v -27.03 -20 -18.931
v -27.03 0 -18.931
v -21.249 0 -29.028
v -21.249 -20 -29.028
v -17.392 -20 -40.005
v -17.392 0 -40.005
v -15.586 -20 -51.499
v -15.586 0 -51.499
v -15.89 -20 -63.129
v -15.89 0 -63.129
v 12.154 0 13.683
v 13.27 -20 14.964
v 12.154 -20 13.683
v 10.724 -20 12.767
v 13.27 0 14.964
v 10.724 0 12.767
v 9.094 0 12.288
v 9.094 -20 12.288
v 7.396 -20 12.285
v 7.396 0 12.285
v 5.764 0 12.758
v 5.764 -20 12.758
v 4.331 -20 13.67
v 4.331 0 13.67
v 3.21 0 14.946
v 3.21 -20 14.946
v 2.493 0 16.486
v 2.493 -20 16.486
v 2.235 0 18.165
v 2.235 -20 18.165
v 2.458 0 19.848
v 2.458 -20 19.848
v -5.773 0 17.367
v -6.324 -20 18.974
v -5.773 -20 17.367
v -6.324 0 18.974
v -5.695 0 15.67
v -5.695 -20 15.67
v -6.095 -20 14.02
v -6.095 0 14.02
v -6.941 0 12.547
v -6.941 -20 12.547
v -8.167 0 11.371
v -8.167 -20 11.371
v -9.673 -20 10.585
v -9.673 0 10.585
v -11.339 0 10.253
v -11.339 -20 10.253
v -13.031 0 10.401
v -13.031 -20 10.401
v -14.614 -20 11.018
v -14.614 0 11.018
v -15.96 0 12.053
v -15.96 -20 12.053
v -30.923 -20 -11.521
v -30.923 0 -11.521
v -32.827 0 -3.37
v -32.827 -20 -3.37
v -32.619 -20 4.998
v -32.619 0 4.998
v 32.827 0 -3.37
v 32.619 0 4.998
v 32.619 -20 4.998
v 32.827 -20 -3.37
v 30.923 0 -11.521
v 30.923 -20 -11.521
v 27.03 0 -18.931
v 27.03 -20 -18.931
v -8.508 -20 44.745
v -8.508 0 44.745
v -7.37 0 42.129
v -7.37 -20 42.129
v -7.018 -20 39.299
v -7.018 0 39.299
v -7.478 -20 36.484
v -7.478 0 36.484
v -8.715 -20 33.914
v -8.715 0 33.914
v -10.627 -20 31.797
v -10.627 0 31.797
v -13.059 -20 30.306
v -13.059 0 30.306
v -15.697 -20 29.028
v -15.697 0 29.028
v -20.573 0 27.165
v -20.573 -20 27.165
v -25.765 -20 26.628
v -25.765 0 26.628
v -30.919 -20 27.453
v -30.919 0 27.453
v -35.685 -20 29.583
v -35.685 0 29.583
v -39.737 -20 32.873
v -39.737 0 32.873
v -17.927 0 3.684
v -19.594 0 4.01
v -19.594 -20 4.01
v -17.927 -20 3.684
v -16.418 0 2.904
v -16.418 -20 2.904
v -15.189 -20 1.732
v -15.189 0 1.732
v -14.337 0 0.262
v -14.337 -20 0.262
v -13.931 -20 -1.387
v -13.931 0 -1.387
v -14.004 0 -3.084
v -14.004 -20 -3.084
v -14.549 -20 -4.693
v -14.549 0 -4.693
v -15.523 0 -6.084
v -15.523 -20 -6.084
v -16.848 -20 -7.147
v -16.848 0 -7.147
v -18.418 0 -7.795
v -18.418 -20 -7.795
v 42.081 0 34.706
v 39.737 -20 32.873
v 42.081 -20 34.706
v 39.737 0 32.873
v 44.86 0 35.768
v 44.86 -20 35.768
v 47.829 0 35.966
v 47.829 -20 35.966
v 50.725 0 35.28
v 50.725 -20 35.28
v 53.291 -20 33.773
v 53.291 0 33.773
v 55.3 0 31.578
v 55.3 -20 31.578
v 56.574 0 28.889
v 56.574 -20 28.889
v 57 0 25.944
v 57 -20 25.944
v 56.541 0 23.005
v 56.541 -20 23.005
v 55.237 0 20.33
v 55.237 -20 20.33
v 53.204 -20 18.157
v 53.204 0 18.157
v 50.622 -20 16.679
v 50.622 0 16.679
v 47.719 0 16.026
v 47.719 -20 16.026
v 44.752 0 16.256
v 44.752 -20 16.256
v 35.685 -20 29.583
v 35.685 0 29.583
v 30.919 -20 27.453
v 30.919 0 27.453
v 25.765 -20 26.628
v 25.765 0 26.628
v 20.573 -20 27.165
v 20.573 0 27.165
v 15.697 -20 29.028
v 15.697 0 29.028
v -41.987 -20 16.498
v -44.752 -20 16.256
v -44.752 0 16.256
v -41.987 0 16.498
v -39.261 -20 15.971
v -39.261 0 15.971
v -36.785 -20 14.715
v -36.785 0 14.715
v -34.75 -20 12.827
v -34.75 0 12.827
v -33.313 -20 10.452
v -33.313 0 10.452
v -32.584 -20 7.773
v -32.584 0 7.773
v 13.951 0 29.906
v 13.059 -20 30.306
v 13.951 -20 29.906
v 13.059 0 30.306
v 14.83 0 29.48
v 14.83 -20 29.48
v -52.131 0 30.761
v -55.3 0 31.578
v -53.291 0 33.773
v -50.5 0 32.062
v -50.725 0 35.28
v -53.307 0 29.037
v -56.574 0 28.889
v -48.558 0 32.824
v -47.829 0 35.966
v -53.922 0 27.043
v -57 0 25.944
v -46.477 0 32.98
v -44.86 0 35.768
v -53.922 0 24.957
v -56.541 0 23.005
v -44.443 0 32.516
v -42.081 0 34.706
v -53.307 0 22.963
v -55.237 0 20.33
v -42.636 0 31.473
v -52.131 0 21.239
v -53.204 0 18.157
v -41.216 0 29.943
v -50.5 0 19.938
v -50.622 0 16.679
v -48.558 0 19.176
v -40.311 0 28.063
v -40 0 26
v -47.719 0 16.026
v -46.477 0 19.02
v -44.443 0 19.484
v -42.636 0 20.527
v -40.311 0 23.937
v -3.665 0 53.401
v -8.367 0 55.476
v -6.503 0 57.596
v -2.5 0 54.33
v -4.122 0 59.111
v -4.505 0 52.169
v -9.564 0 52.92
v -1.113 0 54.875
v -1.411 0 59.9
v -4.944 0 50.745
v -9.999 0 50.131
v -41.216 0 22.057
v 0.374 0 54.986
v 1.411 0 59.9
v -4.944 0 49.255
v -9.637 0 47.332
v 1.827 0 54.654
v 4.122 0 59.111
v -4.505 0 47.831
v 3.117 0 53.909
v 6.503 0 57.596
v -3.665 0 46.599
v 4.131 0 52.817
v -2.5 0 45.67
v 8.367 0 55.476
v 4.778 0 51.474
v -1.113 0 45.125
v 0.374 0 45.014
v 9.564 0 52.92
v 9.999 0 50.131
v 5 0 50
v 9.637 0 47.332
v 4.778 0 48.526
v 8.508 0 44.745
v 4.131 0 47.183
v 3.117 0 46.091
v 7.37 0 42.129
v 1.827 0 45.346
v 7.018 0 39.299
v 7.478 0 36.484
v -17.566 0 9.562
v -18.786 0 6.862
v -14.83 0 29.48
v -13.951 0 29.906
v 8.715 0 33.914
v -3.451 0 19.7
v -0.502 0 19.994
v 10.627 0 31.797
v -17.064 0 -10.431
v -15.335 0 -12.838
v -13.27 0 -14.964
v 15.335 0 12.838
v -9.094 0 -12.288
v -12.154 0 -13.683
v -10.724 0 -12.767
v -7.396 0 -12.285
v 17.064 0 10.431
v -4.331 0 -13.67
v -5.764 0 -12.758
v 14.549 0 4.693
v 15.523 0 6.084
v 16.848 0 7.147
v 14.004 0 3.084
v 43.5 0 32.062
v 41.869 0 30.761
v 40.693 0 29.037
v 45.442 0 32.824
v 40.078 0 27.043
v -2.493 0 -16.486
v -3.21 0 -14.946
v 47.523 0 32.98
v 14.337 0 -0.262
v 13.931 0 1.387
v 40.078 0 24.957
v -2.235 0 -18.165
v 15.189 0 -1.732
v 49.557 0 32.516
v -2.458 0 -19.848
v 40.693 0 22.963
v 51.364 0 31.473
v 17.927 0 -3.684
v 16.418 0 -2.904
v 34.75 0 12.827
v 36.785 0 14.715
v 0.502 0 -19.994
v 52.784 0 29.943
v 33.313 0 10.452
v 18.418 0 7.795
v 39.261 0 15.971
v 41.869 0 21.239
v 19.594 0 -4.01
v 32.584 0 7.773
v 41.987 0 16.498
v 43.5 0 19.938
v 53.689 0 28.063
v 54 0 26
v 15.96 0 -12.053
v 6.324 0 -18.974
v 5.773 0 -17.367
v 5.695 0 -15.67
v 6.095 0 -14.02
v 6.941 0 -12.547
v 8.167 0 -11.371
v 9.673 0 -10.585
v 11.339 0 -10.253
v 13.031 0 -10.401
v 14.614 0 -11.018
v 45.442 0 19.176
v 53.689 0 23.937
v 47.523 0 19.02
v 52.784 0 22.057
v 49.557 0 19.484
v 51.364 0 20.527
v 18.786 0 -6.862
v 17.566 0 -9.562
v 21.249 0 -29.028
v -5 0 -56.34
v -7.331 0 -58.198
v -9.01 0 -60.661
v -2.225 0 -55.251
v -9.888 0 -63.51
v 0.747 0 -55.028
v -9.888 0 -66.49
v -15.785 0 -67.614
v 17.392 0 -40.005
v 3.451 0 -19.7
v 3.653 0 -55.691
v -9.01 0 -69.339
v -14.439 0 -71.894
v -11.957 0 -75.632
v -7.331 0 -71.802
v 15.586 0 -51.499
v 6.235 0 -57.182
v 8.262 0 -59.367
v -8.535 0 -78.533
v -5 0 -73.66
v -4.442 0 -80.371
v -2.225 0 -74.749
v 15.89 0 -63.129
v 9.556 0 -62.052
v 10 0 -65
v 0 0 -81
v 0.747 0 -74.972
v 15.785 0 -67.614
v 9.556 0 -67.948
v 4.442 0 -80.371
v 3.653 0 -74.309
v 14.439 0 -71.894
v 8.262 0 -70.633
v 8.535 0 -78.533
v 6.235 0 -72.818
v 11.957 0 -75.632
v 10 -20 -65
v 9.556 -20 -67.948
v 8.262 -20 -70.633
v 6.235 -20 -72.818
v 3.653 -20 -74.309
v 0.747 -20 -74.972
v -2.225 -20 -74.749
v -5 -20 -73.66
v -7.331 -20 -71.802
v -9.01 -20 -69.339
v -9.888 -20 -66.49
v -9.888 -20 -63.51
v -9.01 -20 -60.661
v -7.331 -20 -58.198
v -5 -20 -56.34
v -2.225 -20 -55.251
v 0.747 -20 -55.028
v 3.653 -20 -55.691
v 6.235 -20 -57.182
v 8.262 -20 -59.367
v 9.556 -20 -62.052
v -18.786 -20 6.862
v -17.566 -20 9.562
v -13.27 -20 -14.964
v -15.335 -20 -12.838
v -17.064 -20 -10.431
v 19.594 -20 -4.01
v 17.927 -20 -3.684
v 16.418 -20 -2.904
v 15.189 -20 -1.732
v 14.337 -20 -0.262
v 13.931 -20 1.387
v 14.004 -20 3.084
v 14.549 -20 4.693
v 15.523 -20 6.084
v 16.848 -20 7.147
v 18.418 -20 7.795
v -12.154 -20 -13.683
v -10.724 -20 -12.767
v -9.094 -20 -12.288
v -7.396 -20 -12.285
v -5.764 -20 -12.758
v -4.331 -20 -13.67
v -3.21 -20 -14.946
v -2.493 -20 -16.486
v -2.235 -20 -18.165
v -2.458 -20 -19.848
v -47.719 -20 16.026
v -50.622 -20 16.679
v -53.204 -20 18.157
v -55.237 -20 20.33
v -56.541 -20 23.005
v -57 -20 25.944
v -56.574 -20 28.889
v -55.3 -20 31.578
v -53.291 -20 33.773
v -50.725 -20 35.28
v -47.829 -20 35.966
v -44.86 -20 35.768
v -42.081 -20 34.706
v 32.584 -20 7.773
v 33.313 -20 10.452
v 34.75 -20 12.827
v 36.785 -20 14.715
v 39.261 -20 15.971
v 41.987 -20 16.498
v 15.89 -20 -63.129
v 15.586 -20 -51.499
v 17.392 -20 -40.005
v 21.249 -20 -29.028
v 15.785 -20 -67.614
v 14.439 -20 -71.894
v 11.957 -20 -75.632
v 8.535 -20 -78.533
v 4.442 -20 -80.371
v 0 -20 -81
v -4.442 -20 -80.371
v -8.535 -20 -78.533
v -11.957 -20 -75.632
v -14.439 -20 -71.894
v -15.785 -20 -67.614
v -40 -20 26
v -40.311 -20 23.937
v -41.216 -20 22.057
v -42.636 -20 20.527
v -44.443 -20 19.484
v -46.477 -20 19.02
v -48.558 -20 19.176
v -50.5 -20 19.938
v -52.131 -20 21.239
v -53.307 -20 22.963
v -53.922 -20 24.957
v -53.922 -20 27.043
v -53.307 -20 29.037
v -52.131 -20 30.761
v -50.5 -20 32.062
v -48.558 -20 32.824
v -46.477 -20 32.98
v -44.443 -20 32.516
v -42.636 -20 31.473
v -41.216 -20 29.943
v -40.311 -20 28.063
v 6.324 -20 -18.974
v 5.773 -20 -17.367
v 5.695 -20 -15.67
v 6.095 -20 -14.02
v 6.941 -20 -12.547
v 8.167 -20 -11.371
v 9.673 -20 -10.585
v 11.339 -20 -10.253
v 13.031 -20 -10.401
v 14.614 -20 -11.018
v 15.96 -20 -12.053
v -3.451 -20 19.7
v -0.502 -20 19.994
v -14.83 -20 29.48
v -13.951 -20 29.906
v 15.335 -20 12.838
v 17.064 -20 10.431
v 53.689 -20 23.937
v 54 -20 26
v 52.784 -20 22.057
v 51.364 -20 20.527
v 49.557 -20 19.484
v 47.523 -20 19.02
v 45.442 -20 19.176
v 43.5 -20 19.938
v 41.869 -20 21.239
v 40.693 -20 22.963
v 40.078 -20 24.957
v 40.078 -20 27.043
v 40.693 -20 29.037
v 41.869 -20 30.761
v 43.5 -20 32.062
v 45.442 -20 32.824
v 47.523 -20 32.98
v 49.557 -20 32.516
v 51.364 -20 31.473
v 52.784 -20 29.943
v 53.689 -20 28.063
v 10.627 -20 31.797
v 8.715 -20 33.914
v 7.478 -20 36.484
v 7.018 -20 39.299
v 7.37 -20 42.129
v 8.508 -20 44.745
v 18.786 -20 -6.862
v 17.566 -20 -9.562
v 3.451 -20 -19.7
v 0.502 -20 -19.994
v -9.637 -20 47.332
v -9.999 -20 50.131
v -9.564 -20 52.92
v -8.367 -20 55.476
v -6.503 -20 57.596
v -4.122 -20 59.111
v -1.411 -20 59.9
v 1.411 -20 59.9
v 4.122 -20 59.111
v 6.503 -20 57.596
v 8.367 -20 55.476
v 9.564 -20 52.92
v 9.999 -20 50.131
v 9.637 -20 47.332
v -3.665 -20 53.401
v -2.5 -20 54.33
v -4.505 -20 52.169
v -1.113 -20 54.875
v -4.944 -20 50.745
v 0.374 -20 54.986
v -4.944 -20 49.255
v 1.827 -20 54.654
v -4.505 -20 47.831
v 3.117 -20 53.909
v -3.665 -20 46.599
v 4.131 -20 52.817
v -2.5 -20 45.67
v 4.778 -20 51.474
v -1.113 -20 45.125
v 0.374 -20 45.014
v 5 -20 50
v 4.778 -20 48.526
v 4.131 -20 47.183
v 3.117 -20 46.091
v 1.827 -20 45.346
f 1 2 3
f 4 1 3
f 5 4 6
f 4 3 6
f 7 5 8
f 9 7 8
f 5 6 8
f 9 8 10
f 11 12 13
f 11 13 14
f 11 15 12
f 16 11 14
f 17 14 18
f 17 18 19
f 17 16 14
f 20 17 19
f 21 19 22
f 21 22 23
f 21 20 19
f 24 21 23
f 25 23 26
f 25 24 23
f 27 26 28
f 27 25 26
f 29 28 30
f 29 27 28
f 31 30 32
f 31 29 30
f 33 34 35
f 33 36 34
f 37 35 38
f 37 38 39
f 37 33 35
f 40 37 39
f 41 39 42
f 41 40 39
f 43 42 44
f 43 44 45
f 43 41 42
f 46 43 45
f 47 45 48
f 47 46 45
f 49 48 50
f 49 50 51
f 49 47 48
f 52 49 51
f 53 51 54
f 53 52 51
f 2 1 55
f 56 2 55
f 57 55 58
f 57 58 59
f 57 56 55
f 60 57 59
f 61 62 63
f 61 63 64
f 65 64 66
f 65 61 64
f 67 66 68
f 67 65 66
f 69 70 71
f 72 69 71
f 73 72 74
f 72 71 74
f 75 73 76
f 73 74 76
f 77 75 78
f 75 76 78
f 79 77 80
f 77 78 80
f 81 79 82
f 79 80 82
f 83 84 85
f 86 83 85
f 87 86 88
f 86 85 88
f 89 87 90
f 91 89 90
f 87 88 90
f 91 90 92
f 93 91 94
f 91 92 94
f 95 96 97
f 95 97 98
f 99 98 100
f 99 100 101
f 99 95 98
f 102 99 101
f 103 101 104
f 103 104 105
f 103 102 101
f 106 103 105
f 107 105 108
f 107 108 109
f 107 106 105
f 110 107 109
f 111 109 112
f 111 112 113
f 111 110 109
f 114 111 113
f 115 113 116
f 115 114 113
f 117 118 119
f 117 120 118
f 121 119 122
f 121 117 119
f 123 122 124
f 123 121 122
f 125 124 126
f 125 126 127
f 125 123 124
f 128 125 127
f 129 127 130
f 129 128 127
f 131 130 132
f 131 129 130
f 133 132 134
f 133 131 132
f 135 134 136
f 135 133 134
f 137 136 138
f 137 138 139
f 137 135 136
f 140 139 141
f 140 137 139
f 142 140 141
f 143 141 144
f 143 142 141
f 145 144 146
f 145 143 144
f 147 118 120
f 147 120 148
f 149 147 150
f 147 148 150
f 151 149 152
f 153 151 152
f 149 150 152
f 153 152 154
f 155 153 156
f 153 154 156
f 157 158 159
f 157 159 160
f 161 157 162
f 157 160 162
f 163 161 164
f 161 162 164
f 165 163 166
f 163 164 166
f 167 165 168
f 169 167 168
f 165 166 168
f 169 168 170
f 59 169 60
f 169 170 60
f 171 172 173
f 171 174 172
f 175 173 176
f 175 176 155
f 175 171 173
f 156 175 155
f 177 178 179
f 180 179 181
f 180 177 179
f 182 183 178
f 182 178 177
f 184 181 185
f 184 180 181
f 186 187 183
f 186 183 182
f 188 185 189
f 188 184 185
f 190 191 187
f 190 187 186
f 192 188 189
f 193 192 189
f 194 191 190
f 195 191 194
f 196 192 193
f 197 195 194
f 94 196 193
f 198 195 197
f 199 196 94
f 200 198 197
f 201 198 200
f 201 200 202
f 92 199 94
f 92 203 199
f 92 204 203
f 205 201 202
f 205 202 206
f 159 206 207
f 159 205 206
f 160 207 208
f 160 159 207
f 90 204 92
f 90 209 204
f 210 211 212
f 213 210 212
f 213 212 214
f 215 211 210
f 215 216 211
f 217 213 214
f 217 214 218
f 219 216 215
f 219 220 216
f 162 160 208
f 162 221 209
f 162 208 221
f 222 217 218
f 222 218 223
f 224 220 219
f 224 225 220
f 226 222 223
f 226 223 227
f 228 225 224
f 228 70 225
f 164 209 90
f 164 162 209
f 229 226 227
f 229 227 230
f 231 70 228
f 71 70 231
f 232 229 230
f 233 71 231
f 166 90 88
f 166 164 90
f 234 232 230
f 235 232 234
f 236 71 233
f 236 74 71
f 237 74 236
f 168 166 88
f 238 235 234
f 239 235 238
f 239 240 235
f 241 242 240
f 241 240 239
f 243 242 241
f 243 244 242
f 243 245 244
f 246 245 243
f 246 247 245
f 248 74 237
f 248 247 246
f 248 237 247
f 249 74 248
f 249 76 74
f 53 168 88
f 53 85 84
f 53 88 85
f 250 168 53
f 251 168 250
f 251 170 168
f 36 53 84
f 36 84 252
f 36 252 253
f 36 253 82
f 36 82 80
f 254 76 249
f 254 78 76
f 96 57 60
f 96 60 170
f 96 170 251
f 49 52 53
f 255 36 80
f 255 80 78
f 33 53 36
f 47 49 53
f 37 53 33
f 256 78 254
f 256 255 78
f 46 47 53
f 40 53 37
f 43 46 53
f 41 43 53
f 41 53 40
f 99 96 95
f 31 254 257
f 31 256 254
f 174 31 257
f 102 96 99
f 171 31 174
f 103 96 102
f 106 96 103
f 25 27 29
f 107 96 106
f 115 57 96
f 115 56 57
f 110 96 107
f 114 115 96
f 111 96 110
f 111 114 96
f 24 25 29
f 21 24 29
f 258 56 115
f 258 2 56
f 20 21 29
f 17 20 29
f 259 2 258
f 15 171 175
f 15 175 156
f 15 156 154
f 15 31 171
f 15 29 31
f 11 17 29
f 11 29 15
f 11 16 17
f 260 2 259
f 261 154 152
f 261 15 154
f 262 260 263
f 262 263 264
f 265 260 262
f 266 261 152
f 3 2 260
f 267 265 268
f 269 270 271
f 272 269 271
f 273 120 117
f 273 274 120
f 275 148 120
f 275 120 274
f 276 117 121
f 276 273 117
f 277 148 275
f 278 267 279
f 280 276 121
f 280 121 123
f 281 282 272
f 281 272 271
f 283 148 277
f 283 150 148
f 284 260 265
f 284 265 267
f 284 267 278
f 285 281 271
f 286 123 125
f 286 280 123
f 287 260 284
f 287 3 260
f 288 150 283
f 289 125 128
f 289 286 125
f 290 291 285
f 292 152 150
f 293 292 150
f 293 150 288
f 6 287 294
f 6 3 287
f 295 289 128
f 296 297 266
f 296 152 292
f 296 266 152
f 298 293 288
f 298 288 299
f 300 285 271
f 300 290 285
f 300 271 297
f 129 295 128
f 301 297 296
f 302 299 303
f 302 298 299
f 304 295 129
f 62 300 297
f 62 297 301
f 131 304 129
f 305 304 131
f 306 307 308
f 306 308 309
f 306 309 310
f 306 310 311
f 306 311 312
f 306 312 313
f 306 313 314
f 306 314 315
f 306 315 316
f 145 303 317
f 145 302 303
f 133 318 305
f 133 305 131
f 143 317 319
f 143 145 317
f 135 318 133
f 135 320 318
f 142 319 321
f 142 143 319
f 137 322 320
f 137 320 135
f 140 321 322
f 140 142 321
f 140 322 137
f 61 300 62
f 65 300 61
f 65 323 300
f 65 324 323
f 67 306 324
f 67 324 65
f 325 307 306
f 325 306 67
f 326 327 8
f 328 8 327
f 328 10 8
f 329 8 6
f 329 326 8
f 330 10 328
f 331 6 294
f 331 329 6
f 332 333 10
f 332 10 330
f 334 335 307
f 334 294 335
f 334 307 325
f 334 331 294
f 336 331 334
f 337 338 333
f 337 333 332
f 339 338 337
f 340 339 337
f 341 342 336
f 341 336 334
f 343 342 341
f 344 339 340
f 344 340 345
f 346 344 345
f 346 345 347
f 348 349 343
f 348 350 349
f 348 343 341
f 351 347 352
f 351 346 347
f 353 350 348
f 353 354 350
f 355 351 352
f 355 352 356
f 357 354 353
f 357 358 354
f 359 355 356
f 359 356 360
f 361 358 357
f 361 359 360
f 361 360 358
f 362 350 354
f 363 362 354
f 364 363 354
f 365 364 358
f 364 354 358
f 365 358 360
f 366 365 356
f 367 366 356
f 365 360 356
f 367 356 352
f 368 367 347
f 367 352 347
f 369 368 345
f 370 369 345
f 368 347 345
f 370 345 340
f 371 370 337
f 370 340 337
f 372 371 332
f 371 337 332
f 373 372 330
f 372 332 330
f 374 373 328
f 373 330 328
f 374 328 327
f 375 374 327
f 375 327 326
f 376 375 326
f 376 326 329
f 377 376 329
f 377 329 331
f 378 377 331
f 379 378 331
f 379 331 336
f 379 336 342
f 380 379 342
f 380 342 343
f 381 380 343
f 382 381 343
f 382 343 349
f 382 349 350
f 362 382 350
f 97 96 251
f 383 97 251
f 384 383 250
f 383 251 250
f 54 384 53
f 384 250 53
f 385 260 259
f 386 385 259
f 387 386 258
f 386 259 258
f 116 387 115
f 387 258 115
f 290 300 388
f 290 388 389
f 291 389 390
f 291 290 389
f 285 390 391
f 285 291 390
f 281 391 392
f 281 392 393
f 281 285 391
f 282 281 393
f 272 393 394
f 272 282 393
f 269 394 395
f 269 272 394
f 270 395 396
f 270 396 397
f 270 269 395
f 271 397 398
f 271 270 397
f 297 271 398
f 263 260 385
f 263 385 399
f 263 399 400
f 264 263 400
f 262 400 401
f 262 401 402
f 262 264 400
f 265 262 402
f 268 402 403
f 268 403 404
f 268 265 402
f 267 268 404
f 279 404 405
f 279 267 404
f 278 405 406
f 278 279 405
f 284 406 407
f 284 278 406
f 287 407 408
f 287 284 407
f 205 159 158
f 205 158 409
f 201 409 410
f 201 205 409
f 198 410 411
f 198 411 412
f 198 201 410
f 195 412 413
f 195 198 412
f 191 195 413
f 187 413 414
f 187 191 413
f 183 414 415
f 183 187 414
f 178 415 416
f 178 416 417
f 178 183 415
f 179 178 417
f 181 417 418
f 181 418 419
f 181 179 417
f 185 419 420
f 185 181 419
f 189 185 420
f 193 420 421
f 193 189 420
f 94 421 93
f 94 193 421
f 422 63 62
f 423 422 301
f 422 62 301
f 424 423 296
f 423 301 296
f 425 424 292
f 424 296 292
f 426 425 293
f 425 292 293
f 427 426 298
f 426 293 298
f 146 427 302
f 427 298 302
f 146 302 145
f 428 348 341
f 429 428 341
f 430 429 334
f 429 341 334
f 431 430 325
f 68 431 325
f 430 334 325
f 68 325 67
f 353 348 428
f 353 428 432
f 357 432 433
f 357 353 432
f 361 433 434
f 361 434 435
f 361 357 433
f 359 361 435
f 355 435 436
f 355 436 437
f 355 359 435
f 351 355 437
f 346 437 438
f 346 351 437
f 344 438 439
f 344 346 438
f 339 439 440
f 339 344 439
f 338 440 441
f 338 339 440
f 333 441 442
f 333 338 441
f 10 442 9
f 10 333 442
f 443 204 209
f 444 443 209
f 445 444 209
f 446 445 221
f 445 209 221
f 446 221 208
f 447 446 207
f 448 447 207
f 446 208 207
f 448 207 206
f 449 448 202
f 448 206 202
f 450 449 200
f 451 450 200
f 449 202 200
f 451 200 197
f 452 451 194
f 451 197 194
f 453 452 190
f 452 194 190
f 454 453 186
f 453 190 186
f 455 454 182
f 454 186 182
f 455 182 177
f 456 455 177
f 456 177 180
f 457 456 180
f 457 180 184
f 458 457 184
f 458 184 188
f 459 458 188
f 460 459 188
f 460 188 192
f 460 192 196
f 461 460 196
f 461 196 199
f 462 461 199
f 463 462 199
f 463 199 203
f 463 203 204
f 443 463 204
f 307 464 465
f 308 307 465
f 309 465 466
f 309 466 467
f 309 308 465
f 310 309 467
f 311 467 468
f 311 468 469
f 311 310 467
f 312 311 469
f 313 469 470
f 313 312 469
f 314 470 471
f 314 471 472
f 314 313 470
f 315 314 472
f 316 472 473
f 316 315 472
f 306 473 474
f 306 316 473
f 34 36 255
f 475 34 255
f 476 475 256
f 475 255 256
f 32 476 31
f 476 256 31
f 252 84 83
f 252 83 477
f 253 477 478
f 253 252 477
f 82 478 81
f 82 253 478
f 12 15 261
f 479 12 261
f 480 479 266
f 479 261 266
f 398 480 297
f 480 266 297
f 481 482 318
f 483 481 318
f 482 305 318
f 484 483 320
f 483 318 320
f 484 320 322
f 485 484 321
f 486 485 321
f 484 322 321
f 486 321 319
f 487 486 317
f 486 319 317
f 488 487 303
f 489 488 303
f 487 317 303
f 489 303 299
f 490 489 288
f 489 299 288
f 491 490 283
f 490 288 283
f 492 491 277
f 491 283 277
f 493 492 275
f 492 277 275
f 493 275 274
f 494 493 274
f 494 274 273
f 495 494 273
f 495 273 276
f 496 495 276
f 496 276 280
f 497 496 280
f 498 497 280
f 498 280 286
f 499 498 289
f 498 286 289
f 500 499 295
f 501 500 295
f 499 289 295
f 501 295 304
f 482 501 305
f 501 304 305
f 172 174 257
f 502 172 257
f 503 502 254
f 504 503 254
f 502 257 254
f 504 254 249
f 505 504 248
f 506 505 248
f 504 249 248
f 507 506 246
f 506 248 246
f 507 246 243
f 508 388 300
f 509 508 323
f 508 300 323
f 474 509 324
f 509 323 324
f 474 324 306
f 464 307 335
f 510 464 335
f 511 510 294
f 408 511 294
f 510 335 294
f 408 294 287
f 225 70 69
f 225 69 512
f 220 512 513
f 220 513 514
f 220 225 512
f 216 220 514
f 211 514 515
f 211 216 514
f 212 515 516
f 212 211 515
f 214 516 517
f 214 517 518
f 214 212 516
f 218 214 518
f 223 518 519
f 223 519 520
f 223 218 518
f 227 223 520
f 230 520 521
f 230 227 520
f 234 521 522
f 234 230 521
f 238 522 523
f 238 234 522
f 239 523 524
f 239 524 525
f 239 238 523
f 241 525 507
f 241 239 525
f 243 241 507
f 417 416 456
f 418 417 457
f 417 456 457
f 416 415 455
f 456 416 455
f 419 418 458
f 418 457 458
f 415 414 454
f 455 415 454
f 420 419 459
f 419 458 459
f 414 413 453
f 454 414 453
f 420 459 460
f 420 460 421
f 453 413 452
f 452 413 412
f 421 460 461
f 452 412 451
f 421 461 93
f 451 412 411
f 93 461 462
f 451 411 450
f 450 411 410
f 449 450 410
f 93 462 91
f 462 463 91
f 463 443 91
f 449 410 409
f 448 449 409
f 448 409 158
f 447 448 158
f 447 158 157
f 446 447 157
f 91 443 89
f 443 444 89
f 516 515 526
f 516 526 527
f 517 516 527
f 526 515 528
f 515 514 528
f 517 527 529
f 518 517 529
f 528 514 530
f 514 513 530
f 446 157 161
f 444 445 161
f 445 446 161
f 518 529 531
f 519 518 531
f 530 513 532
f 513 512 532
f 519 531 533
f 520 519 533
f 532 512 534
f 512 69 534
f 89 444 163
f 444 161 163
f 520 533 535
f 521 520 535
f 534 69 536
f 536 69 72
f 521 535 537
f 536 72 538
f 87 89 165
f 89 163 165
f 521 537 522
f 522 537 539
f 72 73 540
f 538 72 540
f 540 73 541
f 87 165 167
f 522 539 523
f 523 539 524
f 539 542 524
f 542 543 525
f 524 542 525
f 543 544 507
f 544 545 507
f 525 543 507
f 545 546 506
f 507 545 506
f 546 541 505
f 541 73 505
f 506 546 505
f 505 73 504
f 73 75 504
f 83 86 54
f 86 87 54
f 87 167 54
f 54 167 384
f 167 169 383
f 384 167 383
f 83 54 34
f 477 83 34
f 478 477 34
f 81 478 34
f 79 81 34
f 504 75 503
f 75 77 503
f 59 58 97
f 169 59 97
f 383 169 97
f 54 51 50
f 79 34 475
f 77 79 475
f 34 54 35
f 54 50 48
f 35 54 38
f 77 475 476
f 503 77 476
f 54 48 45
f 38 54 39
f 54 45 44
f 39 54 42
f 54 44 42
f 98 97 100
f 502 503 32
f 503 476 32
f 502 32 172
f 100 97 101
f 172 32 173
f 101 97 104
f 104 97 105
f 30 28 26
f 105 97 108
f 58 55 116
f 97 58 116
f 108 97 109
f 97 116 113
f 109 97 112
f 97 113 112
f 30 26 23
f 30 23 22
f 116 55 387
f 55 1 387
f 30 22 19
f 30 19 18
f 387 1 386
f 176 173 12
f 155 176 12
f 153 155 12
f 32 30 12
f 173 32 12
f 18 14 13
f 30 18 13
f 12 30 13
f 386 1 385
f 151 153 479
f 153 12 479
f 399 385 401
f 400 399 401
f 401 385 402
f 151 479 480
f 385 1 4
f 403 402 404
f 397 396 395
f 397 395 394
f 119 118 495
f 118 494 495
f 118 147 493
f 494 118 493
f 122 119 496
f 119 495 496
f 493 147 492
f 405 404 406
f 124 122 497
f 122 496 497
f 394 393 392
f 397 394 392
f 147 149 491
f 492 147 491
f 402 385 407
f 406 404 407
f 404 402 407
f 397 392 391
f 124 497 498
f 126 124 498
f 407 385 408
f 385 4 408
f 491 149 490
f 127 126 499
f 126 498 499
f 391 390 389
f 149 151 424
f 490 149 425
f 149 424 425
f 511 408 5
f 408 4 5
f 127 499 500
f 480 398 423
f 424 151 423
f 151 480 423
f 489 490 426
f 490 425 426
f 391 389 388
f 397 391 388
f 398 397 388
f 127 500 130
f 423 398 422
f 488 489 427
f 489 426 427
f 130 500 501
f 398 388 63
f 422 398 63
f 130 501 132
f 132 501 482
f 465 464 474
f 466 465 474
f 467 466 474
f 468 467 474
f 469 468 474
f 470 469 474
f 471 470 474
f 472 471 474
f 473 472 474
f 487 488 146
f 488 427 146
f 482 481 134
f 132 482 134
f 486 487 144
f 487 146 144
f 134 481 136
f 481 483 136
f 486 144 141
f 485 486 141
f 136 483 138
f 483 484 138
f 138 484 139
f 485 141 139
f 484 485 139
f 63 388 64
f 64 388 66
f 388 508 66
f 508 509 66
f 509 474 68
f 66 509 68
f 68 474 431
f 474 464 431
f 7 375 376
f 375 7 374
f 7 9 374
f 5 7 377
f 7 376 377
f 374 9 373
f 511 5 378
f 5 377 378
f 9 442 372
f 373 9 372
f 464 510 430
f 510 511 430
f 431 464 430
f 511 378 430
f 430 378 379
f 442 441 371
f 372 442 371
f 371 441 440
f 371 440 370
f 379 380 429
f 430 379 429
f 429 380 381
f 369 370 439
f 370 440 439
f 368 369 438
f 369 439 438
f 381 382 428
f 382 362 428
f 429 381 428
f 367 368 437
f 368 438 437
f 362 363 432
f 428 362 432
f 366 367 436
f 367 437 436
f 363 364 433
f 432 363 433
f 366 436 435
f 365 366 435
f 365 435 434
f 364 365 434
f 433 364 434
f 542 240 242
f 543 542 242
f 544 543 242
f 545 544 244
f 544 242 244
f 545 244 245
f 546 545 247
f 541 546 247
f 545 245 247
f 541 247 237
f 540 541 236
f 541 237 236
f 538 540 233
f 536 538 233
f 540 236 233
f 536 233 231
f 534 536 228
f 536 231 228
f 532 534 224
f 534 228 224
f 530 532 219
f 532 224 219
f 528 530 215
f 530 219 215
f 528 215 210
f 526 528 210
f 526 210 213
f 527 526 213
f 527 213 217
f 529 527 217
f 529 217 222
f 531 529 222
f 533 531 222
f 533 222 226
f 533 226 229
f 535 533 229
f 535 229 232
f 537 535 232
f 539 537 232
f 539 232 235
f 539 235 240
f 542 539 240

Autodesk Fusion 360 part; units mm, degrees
sketch "Sketch1" plane through (0, 0, 0) normal (0, 1, 0) x (1, 0, 0)
  circle A0 centre (0, 65) radius 10
  circle A1 centre (0, -50) radius 5
  circle A2 centre (-47, -26) radius 7
  arc A3 (-27.0298, 18.9312) -> (-15.8903, 63.1292) centre (-79.4513, 55.6462) ccw
  arc A4 (-44.752, -16.2559) -> (-32.6194, -4.9975) centre (-42.5041, -6.5119) ccw
  arc A5 (-15.6968, -29.0277) -> (-39.7367, -32.8734) centre (-25.21, -46.6203) ccw
  arc A6 (-8.5079, -44.745) -> (-13.0587, -30.3063) centre (-17.0159, -39.49) ccw
  arc A7 (-15.6968, -29.0277) -> (-13.0587, -30.3063) centre (0, 0) ccw
  arc A8 (-27.0298, 18.9312) -> (-32.6194, -4.9975) centre (0, 0) ccw
  arc A9 (15.8903, 63.1292) -> (-15.8903, 63.1292) centre (0, 65) ccw
  arc A10 (-44.752, -16.2559) -> (-39.7367, -32.8734) centre (-47, -26) ccw
  arc A11 (-8.5079, -44.745) -> (8.5079, -44.745) centre (0, -50) ccw
  arc A12 (15.8903, 63.1292) -> (27.0298, 18.9312) centre (79.4513, 55.6462) ccw
  arc A13 (32.6194, -4.9975) -> (27.0298, 18.9312) centre (0, 0) ccw
  arc A14 (32.6194, -4.9975) -> (44.752, -16.2559) centre (42.5041, -6.5119) ccw
  arc A15 (39.7367, -32.8734) -> (44.752, -16.2559) centre (47, -26) ccw
  circle A16 centre (47, -26) radius 7
  arc A17 (39.7367, -32.8734) -> (15.6968, -29.0277) centre (25.21, -46.6203) ccw
  arc A18 (13.0587, -30.3063) -> (15.6968, -29.0277) centre (0, 0) ccw
  arc A19 (13.0587, -30.3063) -> (8.5079, -44.745) centre (17.0159, -39.49) ccw
  arc A20 (-13.27, 14.9635) -> (-2.4581, 19.8484) centre (-8.2346, 18.2261) ccw
  arc A21 (-19.5938, -4.0104) -> (-18.4182, 7.7954) centre (-19.9016, 1.9817) ccw
  arc A22 (-6.3238, -18.9739) -> (-15.9602, -12.0529) centre (-11.667, -16.2444) ccw
  arc A23 (13.27, -14.9635) -> (2.4581, -19.8484) centre (8.2346, -18.2261) ccw
  arc A24 (19.5938, 4.0104) -> (18.4182, -7.7954) centre (19.9016, -1.9817) ccw
  arc A25 (6.3238, 18.9739) -> (15.9602, 12.0529) centre (11.667, 16.2444) ccw
  arc A26 (6.3238, 18.9739) -> (-2.4581, 19.8484) centre (0, 0) ccw
  arc A27 (19.5938, 4.0104) -> (15.9602, 12.0529) centre (0, 0) ccw
  arc A28 (13.27, -14.9635) -> (18.4182, -7.7954) centre (0, 0) ccw
  arc A29 (-6.3238, -18.9739) -> (2.4581, -19.8484) centre (0, 0) ccw
  arc A30 (-13.27, 14.9635) -> (-18.4182, 7.7954) centre (0, 0) ccw
  arc A31 (-19.5938, -4.0104) -> (-15.9602, -12.0529) centre (0, 0) ccw
  dimension "d1" = 66
  dimension "d2" = 40
  dimension "d3" = 32
  dimension "d4" = 20
  dimension "d5" = 65
  dimension "d6" = 20
  dimension "d7" = 10
  dimension "d8" = 14
  dimension "d9" = 20
  dimension "d10" = 26
  dimension "d11" = 24
  dimension "d12" = 47
  dimension "d13" = 128
  dimension "d14" = 20
  dimension "d15" = 40
  dimension "d16" = 20
  dimension "d17" = 12
  dimension "d19" = 360
extrude "Extrude1" add sketch "Sketch1" against normal blind 20
